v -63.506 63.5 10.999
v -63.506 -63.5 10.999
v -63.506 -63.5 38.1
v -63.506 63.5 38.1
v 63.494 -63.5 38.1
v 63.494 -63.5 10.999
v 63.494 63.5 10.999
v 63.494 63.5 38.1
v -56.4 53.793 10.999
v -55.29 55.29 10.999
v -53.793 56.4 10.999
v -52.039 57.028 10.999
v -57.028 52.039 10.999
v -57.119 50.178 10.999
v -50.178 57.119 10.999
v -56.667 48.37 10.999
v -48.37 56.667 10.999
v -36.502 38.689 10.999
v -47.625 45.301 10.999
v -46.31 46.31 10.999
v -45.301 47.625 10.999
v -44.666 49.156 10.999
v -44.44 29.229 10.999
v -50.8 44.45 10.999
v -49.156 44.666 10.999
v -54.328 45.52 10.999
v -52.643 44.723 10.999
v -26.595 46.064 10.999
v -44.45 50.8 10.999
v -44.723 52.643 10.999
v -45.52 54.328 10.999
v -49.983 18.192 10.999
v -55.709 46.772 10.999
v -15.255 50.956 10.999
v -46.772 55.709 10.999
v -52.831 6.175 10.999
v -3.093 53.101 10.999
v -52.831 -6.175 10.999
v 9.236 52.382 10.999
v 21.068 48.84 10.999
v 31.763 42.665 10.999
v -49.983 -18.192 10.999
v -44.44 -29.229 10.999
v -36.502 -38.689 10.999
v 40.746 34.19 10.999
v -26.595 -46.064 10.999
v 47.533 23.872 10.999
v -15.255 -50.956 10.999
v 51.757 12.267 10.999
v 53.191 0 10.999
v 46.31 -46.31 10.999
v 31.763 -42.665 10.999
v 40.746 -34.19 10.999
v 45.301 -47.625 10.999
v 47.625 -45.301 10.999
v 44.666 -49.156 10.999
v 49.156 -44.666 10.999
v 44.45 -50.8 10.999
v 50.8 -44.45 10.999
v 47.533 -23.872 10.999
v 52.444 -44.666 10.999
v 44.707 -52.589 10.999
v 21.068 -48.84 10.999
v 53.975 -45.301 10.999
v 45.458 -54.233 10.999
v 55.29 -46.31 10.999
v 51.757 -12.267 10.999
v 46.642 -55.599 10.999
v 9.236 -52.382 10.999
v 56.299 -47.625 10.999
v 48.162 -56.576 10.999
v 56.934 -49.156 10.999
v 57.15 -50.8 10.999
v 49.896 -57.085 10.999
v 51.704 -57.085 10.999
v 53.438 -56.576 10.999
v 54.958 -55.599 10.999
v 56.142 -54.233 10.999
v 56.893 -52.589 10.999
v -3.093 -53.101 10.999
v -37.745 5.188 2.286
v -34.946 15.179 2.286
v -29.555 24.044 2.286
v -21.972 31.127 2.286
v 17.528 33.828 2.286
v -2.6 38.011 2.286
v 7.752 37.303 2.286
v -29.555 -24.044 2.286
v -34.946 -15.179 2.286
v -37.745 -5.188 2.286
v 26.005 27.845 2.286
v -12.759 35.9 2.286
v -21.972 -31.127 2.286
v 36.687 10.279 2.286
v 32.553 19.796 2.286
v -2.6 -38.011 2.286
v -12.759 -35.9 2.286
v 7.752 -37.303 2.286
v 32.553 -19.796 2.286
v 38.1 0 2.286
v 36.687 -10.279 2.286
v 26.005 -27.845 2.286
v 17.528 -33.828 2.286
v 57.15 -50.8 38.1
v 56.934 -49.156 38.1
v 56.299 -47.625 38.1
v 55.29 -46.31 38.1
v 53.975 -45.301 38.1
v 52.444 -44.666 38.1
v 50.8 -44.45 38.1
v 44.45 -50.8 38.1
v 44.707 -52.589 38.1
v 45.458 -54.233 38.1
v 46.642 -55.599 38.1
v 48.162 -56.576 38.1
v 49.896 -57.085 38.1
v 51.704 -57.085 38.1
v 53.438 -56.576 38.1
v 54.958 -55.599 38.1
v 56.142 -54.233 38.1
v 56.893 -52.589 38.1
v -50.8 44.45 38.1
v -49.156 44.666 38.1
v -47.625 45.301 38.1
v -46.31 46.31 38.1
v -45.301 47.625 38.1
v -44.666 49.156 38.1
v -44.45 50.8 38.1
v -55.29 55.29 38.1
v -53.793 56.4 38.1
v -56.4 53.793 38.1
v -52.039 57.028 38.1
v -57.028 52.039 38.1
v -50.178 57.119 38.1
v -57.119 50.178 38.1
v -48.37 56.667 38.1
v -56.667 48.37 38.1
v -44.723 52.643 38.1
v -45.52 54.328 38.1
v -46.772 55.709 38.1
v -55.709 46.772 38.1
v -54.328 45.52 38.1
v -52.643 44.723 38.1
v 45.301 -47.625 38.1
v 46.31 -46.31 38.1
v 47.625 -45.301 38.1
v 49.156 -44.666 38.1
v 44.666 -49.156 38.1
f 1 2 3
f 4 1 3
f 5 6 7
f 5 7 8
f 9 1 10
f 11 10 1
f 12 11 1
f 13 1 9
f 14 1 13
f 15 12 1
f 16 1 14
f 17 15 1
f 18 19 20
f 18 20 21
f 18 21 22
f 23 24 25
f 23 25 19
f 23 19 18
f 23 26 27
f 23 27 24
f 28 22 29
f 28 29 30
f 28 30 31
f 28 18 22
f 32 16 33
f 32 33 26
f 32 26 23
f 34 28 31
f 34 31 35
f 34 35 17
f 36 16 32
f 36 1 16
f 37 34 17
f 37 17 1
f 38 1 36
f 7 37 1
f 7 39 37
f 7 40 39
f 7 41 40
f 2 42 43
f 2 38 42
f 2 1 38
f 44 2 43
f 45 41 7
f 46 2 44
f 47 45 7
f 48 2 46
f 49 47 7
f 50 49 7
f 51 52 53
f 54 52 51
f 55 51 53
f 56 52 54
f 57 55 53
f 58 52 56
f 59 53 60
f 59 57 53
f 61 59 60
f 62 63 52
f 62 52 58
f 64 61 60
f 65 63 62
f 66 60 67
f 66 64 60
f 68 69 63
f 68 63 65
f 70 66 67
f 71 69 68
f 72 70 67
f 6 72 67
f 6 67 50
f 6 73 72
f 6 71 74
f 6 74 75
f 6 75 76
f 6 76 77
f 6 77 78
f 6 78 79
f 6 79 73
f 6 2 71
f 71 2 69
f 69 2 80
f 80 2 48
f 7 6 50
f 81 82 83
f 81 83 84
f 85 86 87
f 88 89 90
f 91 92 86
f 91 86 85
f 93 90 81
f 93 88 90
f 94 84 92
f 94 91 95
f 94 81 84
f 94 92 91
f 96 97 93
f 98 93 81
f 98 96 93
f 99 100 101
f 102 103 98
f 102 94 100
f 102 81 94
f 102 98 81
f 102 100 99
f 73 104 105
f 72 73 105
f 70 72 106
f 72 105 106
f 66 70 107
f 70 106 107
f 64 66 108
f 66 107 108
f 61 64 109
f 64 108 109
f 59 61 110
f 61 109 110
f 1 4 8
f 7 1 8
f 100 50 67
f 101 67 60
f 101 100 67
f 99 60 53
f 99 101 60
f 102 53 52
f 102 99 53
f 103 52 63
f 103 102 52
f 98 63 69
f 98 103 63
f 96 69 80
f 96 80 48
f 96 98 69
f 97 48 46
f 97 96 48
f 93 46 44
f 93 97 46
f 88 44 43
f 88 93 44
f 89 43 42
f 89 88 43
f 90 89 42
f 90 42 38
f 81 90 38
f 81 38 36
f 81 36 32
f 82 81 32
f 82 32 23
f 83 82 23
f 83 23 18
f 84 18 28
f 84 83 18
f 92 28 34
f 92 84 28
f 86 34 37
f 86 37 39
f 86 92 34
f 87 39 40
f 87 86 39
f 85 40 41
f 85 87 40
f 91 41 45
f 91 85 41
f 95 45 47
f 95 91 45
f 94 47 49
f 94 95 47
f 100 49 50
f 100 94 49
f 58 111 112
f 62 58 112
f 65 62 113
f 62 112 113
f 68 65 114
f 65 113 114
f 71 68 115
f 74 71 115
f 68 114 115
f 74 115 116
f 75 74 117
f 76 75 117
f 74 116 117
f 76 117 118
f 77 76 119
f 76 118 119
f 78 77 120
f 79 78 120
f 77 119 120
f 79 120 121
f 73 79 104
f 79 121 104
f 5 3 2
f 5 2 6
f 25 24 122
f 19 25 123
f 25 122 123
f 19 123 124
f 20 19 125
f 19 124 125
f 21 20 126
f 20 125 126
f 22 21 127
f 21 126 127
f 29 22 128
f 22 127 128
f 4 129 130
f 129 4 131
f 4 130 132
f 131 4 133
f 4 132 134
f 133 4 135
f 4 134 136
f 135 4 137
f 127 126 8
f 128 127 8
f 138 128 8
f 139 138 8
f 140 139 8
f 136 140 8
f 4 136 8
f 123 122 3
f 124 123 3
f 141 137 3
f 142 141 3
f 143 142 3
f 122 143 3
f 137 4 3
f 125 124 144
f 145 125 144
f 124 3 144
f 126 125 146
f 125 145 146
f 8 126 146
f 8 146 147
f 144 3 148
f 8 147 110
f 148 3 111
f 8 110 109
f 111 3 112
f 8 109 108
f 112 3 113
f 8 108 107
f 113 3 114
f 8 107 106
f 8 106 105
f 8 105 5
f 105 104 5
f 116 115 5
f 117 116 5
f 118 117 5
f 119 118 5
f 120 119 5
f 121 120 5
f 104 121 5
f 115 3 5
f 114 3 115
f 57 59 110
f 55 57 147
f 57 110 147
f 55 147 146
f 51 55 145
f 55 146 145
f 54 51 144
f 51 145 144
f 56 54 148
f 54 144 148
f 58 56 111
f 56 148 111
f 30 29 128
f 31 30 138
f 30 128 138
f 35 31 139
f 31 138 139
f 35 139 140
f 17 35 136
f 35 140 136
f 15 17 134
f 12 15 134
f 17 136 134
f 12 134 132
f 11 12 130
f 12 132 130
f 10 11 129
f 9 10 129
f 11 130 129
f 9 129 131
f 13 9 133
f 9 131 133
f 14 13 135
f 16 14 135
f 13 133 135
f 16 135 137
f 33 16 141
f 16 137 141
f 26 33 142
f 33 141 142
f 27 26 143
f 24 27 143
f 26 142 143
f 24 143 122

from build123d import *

# Parameters (mm, degrees)
F1_W     = 127
F1_H     = 38.1
F2_DEPTH = 63.5
F5_DEPTH = 50.8
F7_DEPTH = 50.8


with BuildPart() as f2:
    # F1 (on Front) → F2 (new body, symmetric)
    with BuildSketch(Plane.XZ):
        with Locations((-0.005746, 19.05)):
            Rectangle(F1_W, F1_H)
    extrude(amount=F2_DEPTH, both=True)

    # F0 (on Front) → F3 (revolve, cut)
    with BuildSketch(Plane.XZ):
        Polygon((53.190532, 10.998523), (38.1, 2.286), (0, 2.286), (0, 0), (132.006165, 0), (132.006165, 10.998523), align=None)
    revolve(axis=Axis((0, 0, 1.143), (0, 0, -1)), mode=Mode.SUBTRACT)

    # F4 (on Top) → F5 (cut, symmetric)
    with BuildSketch(Plane.XY):
        with BuildLine():
            Line((-50.8, 44.45), (-50.8, 50.8))
            Line((-50.8, 50.8), (-44.45, 50.8))
            ThreePointArc((-44.45, 50.8), (-55.290128, 55.290128), (-50.8, 44.45))
        make_face()
        with BuildLine():
            Line((-44.45, 50.8), (-50.8, 50.8))
            Line((-50.8, 50.8), (-50.8, 44.45))
            ThreePointArc((-50.8, 44.45), (-46.309872, 46.309872), (-44.45, 50.8))
        make_face()
    extrude(amount=F5_DEPTH, both=True, mode=Mode.SUBTRACT)

    # F6 (on Top) → F7 (cut, symmetric)
    with BuildSketch(Plane.XY):
        with BuildLine():
            ThreePointArc((50.8, -44.45), (46.309872, -46.309872), (44.45, -50.8))
            Line((44.45, -50.8), (50.8, -50.8))
            Line((50.8, -50.8), (50.8, -44.45))
        make_face()
        with BuildLine():
            Line((50.8, -50.8), (44.45, -50.8))
            ThreePointArc((44.45, -50.8), (50.8, -57.15), (57.15, -50.8))
            ThreePointArc((57.15, -50.8), (55.290128, -46.309872), (50.8, -44.45))
            Line((50.8, -44.45), (50.8, -50.8))
        make_face()
    extrude(amount=F7_DEPTH, both=True, mode=Mode.SUBTRACT)


solid = f2.part
